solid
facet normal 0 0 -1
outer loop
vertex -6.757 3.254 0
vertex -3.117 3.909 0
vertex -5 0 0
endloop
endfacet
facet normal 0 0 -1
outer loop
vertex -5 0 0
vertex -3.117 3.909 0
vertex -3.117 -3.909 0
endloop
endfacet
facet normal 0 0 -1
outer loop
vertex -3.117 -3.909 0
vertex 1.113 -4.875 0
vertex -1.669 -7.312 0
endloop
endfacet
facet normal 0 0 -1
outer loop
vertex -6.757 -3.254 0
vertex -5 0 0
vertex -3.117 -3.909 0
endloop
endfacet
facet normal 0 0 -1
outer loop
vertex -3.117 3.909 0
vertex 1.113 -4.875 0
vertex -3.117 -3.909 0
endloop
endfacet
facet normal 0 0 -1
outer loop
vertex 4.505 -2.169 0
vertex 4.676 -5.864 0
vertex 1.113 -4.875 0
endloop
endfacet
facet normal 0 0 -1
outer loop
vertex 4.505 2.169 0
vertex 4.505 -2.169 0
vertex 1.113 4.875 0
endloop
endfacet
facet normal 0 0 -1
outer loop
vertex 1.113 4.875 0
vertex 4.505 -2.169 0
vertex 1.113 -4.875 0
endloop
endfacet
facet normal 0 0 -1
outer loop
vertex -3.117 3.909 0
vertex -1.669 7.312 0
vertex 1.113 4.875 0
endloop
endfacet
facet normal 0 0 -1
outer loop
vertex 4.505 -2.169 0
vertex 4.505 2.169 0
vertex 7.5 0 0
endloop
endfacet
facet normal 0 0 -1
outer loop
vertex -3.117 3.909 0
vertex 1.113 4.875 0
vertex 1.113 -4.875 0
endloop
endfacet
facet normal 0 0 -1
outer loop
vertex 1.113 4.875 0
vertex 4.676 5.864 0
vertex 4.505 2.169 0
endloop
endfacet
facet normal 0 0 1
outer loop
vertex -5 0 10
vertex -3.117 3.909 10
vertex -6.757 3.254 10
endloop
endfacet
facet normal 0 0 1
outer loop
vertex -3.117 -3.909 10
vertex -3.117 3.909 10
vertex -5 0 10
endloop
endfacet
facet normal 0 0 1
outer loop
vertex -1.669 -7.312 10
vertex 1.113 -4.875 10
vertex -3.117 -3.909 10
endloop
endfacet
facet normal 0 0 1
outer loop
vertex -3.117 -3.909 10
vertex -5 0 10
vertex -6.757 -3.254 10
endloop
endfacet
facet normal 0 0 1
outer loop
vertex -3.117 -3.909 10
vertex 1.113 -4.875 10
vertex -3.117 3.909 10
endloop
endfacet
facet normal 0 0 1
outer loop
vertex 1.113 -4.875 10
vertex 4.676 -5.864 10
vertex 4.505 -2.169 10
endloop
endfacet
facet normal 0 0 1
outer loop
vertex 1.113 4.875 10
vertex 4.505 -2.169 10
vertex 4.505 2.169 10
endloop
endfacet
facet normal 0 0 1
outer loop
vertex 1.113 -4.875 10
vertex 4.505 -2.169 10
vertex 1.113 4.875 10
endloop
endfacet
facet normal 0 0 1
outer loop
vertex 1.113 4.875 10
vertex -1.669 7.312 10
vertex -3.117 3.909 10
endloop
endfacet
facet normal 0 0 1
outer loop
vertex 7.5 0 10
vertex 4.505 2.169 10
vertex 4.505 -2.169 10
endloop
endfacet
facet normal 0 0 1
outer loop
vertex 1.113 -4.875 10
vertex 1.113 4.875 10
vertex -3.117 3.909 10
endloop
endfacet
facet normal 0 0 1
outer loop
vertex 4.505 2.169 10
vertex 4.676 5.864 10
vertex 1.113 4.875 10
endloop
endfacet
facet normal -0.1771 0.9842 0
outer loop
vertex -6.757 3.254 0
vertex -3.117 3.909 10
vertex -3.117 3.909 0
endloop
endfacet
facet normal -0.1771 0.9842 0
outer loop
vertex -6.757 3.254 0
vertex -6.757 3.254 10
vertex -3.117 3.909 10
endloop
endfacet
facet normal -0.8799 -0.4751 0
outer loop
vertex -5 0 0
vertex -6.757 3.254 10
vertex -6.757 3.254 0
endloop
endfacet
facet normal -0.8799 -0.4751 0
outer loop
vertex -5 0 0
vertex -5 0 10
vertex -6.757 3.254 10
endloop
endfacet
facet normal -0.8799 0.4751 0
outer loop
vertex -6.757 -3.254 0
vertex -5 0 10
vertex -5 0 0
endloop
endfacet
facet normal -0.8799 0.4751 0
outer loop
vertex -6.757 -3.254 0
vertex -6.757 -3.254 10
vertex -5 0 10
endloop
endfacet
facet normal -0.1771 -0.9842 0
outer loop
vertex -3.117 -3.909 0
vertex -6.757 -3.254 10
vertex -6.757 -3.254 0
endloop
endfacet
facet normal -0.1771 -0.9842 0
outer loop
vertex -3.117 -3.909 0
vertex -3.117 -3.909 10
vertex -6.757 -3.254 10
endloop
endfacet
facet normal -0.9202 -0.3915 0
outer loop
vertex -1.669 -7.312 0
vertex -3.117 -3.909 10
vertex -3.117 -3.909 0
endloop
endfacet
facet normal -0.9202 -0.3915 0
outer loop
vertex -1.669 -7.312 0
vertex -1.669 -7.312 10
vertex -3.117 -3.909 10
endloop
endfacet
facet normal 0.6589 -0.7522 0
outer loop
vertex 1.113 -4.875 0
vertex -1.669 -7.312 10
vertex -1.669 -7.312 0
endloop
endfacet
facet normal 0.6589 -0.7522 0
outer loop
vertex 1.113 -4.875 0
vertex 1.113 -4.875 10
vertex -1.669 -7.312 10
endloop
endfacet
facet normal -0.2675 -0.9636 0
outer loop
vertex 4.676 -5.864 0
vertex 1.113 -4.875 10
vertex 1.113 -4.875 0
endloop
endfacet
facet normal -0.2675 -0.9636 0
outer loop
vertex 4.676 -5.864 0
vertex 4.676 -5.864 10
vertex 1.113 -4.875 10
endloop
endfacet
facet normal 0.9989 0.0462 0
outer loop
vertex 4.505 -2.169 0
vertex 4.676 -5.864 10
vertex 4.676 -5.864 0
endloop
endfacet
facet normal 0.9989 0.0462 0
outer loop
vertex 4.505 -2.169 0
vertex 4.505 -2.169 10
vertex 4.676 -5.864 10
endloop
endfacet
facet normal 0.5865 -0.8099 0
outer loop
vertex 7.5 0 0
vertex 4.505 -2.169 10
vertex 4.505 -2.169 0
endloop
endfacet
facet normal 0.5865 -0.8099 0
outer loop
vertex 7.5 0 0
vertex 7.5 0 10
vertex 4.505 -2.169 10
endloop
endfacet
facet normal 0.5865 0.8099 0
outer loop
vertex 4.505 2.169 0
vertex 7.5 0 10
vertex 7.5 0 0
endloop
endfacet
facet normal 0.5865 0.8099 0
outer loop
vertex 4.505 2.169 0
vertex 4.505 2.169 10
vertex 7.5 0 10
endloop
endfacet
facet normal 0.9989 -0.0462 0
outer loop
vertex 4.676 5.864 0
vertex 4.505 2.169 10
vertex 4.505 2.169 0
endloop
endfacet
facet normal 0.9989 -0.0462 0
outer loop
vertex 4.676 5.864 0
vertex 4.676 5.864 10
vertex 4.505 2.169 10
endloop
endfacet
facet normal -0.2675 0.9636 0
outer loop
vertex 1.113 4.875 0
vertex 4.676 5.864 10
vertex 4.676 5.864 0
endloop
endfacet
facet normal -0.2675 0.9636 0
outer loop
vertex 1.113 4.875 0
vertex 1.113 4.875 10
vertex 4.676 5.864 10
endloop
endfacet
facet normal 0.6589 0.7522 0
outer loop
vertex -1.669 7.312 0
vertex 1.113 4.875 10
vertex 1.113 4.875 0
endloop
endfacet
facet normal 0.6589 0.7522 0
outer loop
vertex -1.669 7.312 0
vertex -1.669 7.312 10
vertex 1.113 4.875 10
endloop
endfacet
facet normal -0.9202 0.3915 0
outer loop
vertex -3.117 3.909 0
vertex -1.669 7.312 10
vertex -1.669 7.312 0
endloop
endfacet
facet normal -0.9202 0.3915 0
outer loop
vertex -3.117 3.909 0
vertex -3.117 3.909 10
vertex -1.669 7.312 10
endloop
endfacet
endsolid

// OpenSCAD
// shamelessly taken fromss
// https://gist.github.com/anoved/9622826

module star(p, d1=0, d2=0, r1=0, r2=0) 
{ R1= r1!=0 ? r1: d1/2;
  D1= d1!=0 ? d1: 2*r1;
  R2= r2!=0 ? r2: d2/2;
  D2= d2!=0 ? d2: 2*r2;
  
  union()
  { for(i=[0:p-1])
    { i1=[cos(i*360/p - 180/p)*R1,sin(i*360/p - 180/p )*R1]; //first inner point
      i2=[cos(i*360/p + 180/p)*R1,sin(i*360/p + 180/p)*R1]; //second inner point
      i3=[cos(i*360/p + 180)*R1,sin(i*360/p + 180)*R1];      //third inner point
      o=[cos(i*360/p)*R2,sin(i*360/p)*R2];                           //outer point
      polygon([i1,o,i2,i3],[[0,1,2,3]]);
    }
  }
}


linear_extrude(10, true)
    star(7, 10, 15);
